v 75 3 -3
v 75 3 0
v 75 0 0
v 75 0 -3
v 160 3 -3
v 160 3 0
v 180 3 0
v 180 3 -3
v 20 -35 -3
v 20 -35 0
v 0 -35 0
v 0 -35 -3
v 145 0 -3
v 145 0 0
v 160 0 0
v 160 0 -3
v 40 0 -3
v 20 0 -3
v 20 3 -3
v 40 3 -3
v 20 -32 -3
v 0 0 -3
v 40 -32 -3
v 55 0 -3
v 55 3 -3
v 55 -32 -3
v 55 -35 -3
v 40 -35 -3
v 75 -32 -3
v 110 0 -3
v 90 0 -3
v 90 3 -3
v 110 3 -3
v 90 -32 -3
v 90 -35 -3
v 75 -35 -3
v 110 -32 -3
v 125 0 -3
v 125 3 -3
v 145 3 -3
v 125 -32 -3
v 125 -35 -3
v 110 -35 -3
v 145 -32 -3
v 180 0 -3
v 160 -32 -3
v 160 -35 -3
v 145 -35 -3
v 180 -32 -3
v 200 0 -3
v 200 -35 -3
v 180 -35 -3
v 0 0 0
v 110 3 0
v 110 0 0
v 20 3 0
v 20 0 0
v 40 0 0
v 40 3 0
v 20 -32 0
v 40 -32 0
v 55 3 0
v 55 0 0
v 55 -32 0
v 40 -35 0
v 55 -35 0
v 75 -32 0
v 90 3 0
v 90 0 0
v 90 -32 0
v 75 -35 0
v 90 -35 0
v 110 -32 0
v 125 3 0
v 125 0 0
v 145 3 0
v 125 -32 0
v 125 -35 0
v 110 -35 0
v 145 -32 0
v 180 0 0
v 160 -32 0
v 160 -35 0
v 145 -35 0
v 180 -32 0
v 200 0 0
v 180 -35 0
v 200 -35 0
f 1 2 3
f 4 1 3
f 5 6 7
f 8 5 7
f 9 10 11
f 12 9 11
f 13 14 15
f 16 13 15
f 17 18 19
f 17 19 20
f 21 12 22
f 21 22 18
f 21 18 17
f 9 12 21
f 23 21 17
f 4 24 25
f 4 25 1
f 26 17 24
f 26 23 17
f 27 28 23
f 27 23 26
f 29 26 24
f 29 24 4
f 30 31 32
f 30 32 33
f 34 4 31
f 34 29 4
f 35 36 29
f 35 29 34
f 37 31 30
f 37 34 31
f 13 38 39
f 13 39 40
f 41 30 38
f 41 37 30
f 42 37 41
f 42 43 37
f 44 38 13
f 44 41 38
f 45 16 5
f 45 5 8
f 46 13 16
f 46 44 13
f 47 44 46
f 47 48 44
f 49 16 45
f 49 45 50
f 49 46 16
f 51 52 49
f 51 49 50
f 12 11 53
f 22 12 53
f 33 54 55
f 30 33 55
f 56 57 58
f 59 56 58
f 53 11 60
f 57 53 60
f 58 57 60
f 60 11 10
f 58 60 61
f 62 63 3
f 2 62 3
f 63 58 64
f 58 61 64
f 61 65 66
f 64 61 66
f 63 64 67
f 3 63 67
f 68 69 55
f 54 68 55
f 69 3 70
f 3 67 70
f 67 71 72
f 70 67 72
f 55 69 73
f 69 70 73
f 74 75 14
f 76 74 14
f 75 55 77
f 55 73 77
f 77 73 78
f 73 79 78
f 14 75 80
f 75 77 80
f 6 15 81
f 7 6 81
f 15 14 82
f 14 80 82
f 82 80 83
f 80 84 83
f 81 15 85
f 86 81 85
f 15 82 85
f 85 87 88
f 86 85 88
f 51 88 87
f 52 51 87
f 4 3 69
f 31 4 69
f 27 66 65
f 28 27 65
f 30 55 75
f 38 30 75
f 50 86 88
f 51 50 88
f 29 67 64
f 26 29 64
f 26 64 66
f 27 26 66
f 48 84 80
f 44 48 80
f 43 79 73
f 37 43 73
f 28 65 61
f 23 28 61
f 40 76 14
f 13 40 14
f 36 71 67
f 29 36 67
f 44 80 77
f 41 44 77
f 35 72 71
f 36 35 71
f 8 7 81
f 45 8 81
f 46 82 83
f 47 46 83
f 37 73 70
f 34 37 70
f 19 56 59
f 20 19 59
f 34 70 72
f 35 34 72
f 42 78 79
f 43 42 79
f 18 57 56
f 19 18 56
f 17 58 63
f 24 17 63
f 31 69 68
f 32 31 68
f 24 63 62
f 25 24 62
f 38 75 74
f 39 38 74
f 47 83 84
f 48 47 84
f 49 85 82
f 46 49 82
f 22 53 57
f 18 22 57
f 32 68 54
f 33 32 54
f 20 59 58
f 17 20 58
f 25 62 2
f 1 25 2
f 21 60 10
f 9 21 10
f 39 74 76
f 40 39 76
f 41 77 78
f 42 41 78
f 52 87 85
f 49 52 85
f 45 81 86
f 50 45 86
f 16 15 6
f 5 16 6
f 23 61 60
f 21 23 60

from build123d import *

# Parameters (mm, degrees)
BOSS_EXTRUDE1_DEPTH = 3


with BuildPart() as part:
    # Sketch1 → Boss-Extrude1 (new body)
    with BuildSketch(Plane(origin=(0, 0, 0), x_dir=(1, 0, 0), z_dir=(0, 0, -1))):
        Polygon((40, 0), (55, 0), (55, -3), (75, -3), (75, 0), (90, 0), (90, -3), (110, -3), (110, 0), (125, 0), (125, -3), (145, -3), (145, 0), (160, 0), (160, -3), (180, -3), (180, 0), (200, 0), (200, 35), (180, 35), (180, 32), (160, 32), (160, 35), (145, 35), (145, 32), (125, 32), (125, 35), (110, 35), (110, 32), (90, 32), (90, 35), (75, 35), (75, 32), (55, 32), (55, 35), (40, 35), (40, 32), (20, 32), (20, 35), (0, 35), (0, 0), (20, 0), (20, -3), (40, -3), align=None)
    extrude(amount=BOSS_EXTRUDE1_DEPTH)


solid = part.part
